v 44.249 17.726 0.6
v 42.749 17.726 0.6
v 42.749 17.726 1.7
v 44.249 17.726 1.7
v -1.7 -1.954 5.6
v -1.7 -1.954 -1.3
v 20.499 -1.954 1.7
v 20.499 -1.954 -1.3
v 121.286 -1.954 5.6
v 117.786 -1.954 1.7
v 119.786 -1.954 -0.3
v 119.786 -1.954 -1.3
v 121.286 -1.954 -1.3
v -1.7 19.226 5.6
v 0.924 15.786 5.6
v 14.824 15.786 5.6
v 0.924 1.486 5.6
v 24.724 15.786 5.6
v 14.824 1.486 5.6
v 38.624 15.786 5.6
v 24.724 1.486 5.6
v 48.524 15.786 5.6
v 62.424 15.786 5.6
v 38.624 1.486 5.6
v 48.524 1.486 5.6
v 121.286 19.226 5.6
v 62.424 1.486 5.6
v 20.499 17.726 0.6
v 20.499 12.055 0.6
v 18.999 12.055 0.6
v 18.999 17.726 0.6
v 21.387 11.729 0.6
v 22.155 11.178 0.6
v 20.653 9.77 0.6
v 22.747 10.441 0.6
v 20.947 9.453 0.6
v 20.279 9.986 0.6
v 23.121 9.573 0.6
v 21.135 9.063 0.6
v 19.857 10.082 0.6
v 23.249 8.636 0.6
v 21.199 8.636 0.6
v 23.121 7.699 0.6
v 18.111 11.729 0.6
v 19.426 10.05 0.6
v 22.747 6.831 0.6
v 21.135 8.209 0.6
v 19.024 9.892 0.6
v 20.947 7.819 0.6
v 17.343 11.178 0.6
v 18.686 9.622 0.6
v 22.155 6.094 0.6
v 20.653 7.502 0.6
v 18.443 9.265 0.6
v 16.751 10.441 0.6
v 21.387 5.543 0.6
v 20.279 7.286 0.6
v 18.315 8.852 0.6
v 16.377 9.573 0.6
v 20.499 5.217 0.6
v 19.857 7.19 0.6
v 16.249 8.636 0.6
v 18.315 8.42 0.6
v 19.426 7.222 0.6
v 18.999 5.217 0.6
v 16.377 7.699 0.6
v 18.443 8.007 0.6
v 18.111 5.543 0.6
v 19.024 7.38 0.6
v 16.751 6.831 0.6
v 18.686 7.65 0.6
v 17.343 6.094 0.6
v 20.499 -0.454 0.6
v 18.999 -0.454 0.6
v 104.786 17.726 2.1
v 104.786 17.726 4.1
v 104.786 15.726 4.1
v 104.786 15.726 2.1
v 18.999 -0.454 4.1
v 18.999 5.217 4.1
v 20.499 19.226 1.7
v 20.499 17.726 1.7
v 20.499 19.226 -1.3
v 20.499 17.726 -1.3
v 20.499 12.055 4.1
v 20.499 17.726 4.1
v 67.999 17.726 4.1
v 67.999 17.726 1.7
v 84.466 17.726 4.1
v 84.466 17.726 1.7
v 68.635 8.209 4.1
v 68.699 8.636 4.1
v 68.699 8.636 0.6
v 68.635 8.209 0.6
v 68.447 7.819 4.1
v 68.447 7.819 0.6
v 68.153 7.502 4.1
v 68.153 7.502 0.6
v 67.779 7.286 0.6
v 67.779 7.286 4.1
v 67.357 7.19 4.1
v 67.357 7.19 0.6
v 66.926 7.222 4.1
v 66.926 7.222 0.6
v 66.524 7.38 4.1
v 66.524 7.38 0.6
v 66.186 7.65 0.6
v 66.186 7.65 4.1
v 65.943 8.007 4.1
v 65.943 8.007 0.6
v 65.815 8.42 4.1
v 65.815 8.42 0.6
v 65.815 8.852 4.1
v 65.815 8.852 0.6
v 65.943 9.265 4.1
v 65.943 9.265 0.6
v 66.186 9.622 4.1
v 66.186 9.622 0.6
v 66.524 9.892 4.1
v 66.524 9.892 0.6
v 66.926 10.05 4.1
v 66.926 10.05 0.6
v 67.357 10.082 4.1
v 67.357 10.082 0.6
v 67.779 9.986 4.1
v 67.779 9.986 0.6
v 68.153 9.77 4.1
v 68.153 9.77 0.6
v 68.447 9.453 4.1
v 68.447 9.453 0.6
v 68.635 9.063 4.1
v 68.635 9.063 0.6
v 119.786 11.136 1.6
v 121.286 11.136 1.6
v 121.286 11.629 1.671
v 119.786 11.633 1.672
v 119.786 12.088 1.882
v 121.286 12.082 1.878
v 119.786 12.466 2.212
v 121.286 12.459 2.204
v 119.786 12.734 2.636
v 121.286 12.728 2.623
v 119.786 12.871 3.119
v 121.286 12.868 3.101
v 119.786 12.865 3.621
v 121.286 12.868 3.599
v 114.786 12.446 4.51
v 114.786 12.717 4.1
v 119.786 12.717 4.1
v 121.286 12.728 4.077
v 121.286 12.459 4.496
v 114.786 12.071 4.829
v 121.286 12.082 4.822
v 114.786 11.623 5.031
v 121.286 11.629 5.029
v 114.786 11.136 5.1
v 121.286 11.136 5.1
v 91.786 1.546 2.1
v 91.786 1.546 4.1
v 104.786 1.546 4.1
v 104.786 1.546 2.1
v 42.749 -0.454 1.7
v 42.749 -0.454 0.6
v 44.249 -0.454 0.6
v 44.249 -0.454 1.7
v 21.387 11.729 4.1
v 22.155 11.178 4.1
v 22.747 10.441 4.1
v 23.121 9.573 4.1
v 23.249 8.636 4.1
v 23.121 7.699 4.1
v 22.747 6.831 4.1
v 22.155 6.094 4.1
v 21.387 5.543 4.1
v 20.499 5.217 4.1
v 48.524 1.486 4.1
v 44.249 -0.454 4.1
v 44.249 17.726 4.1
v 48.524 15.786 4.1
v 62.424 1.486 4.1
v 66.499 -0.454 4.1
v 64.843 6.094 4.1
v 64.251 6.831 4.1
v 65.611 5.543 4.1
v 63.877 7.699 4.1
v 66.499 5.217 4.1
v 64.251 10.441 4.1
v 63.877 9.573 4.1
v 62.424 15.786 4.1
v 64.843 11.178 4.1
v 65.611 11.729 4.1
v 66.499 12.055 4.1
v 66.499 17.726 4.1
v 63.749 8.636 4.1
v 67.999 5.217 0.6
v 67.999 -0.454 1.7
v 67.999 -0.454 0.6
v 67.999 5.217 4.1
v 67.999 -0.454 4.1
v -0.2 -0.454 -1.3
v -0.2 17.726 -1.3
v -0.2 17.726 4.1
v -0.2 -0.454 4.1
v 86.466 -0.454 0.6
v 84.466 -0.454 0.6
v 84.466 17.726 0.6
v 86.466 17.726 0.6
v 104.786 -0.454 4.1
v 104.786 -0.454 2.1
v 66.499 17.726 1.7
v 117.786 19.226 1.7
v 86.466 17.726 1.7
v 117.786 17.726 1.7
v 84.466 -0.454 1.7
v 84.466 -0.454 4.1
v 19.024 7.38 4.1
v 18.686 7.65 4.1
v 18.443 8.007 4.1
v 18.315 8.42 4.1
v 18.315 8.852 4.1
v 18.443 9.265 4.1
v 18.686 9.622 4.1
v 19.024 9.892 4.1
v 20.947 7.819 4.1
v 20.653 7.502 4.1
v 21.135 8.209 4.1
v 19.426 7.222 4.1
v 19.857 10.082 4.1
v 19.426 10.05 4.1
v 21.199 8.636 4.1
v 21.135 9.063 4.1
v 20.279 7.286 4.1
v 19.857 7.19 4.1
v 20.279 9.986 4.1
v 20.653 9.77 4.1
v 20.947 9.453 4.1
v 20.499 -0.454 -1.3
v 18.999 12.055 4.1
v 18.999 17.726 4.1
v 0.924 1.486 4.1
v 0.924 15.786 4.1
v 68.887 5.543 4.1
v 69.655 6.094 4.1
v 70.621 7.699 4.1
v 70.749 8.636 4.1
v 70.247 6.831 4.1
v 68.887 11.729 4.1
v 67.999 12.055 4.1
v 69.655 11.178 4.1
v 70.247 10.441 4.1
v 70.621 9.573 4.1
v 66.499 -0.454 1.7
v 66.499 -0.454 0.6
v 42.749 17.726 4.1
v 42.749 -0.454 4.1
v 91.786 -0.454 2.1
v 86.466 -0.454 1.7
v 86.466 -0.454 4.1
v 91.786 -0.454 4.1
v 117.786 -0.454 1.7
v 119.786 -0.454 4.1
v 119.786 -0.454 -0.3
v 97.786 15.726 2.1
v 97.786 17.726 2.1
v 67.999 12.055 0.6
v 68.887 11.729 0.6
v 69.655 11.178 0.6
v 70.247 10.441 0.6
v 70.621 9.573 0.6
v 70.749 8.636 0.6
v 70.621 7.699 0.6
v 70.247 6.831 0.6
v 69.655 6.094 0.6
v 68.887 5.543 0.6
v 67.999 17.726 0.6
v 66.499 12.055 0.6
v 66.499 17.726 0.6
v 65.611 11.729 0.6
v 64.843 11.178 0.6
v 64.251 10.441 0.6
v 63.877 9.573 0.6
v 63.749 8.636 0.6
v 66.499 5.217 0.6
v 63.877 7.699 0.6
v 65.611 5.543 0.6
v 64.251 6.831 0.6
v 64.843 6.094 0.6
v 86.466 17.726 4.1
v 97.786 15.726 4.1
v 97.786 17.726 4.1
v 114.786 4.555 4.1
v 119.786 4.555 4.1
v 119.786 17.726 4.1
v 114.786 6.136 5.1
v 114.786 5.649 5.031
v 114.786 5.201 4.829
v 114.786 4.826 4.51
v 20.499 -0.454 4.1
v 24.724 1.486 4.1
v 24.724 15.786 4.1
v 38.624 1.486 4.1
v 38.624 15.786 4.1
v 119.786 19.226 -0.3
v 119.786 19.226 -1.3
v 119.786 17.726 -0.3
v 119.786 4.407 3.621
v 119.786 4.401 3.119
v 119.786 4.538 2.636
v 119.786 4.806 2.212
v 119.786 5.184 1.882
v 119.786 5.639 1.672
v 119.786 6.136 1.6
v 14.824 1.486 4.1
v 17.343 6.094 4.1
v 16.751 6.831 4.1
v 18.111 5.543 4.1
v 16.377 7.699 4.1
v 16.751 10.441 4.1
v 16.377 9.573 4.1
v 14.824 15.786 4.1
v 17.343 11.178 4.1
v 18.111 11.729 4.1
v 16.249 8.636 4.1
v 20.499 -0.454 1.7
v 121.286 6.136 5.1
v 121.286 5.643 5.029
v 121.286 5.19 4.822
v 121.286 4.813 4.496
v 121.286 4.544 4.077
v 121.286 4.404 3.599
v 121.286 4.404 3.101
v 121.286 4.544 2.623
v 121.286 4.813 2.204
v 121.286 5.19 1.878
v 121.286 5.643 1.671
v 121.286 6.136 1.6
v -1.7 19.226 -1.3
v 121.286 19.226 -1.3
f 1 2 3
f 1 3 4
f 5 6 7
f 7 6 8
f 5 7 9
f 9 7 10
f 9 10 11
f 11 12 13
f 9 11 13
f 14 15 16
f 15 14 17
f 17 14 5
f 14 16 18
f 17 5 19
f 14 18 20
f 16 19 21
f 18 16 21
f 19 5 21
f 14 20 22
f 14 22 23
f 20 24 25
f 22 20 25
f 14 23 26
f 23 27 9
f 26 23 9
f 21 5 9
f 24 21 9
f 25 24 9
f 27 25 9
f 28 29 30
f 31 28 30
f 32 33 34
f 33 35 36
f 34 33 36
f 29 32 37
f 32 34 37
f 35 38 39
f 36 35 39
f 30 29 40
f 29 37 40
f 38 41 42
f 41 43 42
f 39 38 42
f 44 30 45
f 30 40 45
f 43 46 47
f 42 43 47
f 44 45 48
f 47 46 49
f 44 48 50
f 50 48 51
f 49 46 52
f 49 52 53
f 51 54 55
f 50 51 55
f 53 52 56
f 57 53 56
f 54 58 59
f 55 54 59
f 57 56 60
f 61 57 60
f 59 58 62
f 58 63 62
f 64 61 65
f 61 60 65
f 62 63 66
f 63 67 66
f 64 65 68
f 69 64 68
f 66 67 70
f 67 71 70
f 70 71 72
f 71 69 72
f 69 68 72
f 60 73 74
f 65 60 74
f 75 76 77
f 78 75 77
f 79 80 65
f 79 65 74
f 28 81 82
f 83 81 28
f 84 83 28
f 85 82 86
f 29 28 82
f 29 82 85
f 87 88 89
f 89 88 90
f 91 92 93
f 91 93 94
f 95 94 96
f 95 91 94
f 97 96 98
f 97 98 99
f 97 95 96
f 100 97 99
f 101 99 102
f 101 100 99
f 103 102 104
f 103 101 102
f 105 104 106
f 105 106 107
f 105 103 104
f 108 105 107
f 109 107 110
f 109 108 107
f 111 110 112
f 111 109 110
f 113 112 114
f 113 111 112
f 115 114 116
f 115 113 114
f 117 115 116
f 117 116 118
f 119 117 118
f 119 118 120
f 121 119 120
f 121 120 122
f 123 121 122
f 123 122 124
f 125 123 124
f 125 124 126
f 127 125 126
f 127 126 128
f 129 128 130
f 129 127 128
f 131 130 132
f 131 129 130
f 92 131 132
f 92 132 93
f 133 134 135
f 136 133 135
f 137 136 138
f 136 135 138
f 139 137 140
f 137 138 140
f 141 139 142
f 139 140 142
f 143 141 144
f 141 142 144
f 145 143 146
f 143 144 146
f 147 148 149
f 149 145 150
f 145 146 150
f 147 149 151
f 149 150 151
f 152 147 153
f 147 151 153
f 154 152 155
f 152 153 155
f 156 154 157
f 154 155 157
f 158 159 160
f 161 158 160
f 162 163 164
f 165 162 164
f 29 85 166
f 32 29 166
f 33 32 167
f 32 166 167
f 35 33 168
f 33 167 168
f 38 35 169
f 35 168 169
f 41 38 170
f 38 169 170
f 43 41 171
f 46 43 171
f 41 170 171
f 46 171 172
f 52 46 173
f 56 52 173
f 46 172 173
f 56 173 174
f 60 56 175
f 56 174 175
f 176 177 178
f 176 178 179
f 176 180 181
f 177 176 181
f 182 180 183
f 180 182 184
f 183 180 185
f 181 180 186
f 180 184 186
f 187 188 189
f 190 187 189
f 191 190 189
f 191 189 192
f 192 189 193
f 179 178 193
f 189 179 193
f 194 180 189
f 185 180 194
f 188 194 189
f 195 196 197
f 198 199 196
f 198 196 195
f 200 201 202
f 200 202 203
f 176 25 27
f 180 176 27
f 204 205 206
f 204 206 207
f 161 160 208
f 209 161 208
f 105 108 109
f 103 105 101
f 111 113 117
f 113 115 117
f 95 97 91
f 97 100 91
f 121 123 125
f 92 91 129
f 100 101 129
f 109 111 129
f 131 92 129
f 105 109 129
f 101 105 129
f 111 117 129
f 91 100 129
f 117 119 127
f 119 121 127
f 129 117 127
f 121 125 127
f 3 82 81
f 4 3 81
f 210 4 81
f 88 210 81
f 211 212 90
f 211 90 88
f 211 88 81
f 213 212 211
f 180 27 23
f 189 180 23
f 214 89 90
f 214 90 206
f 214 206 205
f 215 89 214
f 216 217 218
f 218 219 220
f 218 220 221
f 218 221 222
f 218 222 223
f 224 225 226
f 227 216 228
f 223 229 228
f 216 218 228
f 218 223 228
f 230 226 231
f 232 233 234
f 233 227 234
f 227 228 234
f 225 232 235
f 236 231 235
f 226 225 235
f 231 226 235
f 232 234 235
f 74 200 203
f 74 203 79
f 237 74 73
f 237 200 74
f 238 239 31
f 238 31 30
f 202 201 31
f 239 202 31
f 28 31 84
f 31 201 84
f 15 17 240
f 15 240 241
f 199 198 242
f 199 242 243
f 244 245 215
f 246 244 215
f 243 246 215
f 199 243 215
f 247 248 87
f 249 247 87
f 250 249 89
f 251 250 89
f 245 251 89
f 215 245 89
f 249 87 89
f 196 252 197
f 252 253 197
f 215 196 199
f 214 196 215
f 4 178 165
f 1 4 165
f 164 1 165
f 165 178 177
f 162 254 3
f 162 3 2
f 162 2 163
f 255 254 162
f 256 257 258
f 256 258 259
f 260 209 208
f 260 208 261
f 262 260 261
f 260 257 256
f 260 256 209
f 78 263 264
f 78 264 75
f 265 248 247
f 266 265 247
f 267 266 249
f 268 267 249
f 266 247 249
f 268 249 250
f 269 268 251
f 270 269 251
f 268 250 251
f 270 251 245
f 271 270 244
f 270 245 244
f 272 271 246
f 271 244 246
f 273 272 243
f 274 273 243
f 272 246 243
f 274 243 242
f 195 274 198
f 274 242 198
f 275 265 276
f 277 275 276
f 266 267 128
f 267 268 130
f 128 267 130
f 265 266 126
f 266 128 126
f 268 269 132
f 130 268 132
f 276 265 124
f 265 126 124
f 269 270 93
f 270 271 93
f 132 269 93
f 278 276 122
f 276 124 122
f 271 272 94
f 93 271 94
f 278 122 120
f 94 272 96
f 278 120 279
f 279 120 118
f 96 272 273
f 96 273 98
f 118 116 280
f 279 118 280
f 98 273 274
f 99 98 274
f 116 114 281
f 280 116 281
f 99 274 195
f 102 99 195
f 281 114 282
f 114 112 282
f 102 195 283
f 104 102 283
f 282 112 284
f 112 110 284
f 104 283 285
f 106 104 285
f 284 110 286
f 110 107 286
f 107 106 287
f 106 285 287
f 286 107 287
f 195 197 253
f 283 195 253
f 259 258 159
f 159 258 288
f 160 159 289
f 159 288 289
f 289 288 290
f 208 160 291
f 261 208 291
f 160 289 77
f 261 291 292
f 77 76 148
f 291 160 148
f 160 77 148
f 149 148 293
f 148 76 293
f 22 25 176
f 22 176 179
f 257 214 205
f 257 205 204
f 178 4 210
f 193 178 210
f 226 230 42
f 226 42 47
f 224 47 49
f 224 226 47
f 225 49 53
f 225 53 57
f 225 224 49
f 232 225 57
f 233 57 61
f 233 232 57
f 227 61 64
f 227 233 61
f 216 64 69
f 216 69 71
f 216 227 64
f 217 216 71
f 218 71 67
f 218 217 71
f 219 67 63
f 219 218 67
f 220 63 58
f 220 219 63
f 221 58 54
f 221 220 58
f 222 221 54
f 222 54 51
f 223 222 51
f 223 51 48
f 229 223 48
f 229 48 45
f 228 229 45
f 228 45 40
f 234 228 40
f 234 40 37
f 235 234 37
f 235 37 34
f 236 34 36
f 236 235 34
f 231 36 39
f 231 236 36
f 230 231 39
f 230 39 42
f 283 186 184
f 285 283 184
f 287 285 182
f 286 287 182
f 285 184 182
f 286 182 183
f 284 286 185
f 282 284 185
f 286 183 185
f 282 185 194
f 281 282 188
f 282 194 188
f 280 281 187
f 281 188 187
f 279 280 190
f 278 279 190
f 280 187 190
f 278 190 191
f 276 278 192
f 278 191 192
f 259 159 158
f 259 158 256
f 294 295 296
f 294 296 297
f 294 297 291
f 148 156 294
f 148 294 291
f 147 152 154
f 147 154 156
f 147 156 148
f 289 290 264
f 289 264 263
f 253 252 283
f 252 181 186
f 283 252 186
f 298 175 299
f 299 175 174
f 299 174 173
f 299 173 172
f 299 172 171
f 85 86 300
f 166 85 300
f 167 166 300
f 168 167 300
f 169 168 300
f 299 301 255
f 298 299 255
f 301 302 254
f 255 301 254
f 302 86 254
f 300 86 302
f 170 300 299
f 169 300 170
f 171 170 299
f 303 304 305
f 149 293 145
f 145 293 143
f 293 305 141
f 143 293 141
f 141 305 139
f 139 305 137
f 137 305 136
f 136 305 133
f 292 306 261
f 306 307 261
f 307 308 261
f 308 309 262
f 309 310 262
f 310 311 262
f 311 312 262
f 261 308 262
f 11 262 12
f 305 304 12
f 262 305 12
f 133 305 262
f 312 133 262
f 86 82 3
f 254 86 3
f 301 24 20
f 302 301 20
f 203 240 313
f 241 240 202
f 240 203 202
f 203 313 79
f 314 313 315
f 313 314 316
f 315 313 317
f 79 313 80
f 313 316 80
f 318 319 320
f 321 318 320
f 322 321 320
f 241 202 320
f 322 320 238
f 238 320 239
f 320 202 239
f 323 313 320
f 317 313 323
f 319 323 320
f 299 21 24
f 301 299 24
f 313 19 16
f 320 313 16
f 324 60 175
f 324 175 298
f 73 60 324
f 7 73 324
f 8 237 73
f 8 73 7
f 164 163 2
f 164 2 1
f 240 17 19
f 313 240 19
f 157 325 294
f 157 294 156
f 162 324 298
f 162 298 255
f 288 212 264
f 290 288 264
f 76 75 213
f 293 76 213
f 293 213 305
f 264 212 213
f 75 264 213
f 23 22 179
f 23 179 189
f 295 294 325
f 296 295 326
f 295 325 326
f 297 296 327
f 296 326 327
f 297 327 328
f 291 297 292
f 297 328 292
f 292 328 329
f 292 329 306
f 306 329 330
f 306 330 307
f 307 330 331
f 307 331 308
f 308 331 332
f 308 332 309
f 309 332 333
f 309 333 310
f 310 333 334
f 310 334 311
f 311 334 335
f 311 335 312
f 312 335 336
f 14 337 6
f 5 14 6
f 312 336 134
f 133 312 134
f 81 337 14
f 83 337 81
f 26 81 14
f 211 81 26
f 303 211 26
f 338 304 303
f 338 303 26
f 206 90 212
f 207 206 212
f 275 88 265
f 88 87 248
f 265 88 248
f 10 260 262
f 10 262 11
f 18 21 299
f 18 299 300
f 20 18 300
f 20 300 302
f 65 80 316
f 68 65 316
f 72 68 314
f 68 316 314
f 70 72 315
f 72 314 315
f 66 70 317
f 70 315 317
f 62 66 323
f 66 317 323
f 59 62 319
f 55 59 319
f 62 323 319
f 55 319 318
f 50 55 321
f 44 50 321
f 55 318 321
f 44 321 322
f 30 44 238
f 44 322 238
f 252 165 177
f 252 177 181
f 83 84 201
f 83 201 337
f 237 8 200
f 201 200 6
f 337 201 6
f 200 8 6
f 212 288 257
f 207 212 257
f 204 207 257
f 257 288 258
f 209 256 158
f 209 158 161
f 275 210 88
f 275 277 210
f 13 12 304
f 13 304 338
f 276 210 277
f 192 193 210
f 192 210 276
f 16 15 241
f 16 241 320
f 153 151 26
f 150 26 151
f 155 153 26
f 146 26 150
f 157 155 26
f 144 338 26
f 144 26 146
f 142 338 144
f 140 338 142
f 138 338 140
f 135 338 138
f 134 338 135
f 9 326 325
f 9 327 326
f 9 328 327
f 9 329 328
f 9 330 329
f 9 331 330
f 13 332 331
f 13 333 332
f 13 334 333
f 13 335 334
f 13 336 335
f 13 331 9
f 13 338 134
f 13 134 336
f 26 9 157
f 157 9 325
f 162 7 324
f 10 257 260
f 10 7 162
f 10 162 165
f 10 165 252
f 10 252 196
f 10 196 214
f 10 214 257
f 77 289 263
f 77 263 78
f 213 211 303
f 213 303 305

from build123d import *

# Parameters (mm, degrees)
SKETCH005_W     = 122.986
SKETCH005_H     = 21.18
SKETCH005_W_2   = 119.986
SKETCH005_H_2   = 18.18
PAD004_DEPTH    = 9.9
SKETCH006_W     = 122.986
SKETCH006_H     = 21.18
PAD005_DEPTH    = 1.5
SKETCH007_W     = 13.9
SKETCH007_H     = 14.3
POCKET001_DEPTH = 9.901
SKETCH008_R     = 1.45
SKETCH008_W     = 1.5
SKETCH008_H     = 18.18
PAD006_DEPTH    = 3.5
SKETCH009_W     = 7
SKETCH009_H     = 2
SKETCH009_W_2   = 13
PAD007_DEPTH    = 2
POCKET002_DEPTH = 6.5
SKETCH011_W     = 99.287
SKETCH011_H     = 1.5
POCKET003_DEPTH = 6
SKETCH012_W     = 1.5
SKETCH012_H     = 21.18
POCKET004_DEPTH = 3
CHAMFER003_SIZE = 2
SKETCH013_W     = 2
SKETCH013_H     = 18.18
PAD008_DEPTH    = 3.5


with BuildPart() as part:
    # Sketch005 (on ShapeBinder) → Pad004 (new body)
    with BuildSketch(Plane(origin=(-93.484762, 101.426, -4.3), x_dir=(1, 0, 0), z_dir=(0, 0, -1))):
        with Locations((153.277762, 92.79)):
            Rectangle(SKETCH005_W, SKETCH005_H)
        with Locations((153.277762, 92.79)):
            Rectangle(SKETCH005_W_2, SKETCH005_H_2, mode=Mode.SUBTRACT)
    extrude(amount=-PAD004_DEPTH)

    # Sketch006 (on Face10 of Pad004) → Pad005 (join)
    with BuildSketch(Plane(origin=(-93.484762, 101.426, 5.6), x_dir=(1, 0, 0), z_dir=(0, 0, 1))):
        with Locations((153.277762, -92.79)):
            Rectangle(SKETCH006_W, SKETCH006_H)
    extrude(amount=-PAD005_DEPTH)

    # Sketch007 (on Face16 of Pad005) → Pocket001 (cut, through all)
    with BuildSketch(Plane(origin=(-93.484762, 101.426, 5.6), x_dir=(1, 0, 0), z_dir=(0, 0, 1))):
        with Locations((101.358762, -92.79)):
            Rectangle(SKETCH007_W, SKETCH007_H)
        with Locations((125.158762, -92.79)):
            Rectangle(SKETCH007_W, SKETCH007_H)
        with Locations((148.958762, -92.79)):
            Rectangle(SKETCH007_W, SKETCH007_H)
    extrude(amount=-POCKET001_DEPTH, mode=Mode.SUBTRACT)

    # Sketch008 (on Face15 of Pocket001) → Pad006 (join)
    with BuildSketch(Plane(origin=(-93.484762, 101.426, 4.1), x_dir=(1, 0, 0), z_dir=(0, 0, -1))):
        with BuildLine():
            Line((112.483762, 96.208699), (112.483762, 101.88))
            Line((112.483762, 101.88), (113.983762, 101.88))
            Line((113.983762, 101.88), (113.983762, 96.208699))
            ThreePointArc((113.983762, 89.371301), (116.733762, 92.79), (113.983762, 96.208699))
            Line((113.983762, 83.7), (113.983762, 89.371301))
            Line((112.483762, 83.7), (113.983762, 83.7))
            Line((112.483762, 83.7), (112.483762, 89.371301))
            ThreePointArc((112.483762, 96.208699), (109.733762, 92.79), (112.483762, 89.371301))
        make_face()
        with Locations((113.233762, 92.79)):
            Circle(SKETCH008_R, mode=Mode.SUBTRACT)
        with Locations((136.983762, 92.79)):
            Rectangle(SKETCH008_W, SKETCH008_H)
        with BuildLine():
            Line((159.983762, 101.88), (161.483762, 101.88))
            Line((161.483762, 101.88), (161.483762, 96.208699))
            ThreePointArc((161.483762, 89.371301), (164.233762, 92.79), (161.483762, 96.208699))
            Line((161.483762, 83.7), (161.483762, 89.371301))
            Line((159.983762, 83.7), (161.483762, 83.7))
            Line((159.983762, 83.7), (159.983762, 89.371301))
            ThreePointArc((159.983762, 96.208699), (157.233762, 92.79), (159.983762, 89.371301))
            Line((159.983762, 101.88), (159.983762, 96.208699))
        make_face()
        with Locations((160.733762, 92.79)):
            Circle(SKETCH008_R, mode=Mode.SUBTRACT)
    extrude(amount=PAD006_DEPTH)

    # Sketch009 (on Face27 of Pad006) → Pad007 (join)
    with BuildSketch(Plane(origin=(-93.484762, 101.426, 4.1), x_dir=(1, 0, 0), z_dir=(0, 0, -1))):
        with Locations((194.770762, 84.7)):
            Rectangle(SKETCH009_W, SKETCH009_H)
        with Locations((191.770762, 100.88)):
            Rectangle(SKETCH009_W_2, SKETCH009_H)
    extrude(amount=PAD007_DEPTH)

    # Sketch010 (on Face5 of Pad007) → Pocket002 (cut)
    with BuildSketch(Plane(origin=(121.286, 101.426, -1.6), x_dir=(0, 1, 0), z_dir=(1, 0, 0))):
        with BuildLine():
            ThreePointArc((-95.29, 6.7), (-97.04, 4.95), (-95.29, 3.2))
            Line((-95.29, 3.2), (-90.29, 3.2))
            ThreePointArc((-90.29, 3.2), (-88.54, 4.95), (-90.29, 6.7))
            Line((-95.29, 6.7), (-90.29, 6.7))
        make_face()
    extrude(amount=-POCKET002_DEPTH, mode=Mode.SUBTRACT)

    # Sketch011 (on Face2 of Pocket002) → Pocket003 (cut)
    with BuildSketch(Plane(origin=(-93.484762, 101.426, -4.3), x_dir=(1, 0, 0), z_dir=(0, 0, -1))):
        with Locations((163.627262, 102.63)):
            Rectangle(SKETCH011_W, SKETCH011_H)
        with Locations((163.627262, 82.95)):
            Rectangle(SKETCH011_W, SKETCH011_H)
    extrude(amount=-POCKET003_DEPTH, mode=Mode.SUBTRACT)

    # Sketch012 (on Face6 of Pocket003) → Pocket004 (cut)
    with BuildSketch(Plane(origin=(-93.484762, 101.426, -4.3), x_dir=(1, 0, 0), z_dir=(0, 0, -1))):
        Polygon((113.983762, 103.38), (113.983762, 101.88), (93.284762, 101.88), (93.284762, 83.7), (113.983762, 83.7), (113.983762, 82.2), (91.784762, 82.2), (91.784762, 103.38), align=None)
        with Locations((214.020762, 92.79)):
            Rectangle(SKETCH012_W, SKETCH012_H)
    extrude(amount=-POCKET004_DEPTH, mode=Mode.SUBTRACT)

    # Chamfer003
    chamfer003_edges = [part.edges().sort_by_distance(p)[0] for p in [
        (119.786, 18.476, 1.7),
        (119.786, -1.204, 1.7),
    ]]
    chamfer(chamfer003_edges, length=CHAMFER003_SIZE)

    # Sketch013 (on Face31 of Chamfer003) → Pad008 (join)
    with BuildSketch(Plane(origin=(-93.484762, 101.426, 4.1), x_dir=(1, 0, 0), z_dir=(0, 0, -1))):
        with Locations((178.950762, 92.79)):
            Rectangle(SKETCH013_W, SKETCH013_H)
    extrude(amount=PAD008_DEPTH)


solid = part.part
